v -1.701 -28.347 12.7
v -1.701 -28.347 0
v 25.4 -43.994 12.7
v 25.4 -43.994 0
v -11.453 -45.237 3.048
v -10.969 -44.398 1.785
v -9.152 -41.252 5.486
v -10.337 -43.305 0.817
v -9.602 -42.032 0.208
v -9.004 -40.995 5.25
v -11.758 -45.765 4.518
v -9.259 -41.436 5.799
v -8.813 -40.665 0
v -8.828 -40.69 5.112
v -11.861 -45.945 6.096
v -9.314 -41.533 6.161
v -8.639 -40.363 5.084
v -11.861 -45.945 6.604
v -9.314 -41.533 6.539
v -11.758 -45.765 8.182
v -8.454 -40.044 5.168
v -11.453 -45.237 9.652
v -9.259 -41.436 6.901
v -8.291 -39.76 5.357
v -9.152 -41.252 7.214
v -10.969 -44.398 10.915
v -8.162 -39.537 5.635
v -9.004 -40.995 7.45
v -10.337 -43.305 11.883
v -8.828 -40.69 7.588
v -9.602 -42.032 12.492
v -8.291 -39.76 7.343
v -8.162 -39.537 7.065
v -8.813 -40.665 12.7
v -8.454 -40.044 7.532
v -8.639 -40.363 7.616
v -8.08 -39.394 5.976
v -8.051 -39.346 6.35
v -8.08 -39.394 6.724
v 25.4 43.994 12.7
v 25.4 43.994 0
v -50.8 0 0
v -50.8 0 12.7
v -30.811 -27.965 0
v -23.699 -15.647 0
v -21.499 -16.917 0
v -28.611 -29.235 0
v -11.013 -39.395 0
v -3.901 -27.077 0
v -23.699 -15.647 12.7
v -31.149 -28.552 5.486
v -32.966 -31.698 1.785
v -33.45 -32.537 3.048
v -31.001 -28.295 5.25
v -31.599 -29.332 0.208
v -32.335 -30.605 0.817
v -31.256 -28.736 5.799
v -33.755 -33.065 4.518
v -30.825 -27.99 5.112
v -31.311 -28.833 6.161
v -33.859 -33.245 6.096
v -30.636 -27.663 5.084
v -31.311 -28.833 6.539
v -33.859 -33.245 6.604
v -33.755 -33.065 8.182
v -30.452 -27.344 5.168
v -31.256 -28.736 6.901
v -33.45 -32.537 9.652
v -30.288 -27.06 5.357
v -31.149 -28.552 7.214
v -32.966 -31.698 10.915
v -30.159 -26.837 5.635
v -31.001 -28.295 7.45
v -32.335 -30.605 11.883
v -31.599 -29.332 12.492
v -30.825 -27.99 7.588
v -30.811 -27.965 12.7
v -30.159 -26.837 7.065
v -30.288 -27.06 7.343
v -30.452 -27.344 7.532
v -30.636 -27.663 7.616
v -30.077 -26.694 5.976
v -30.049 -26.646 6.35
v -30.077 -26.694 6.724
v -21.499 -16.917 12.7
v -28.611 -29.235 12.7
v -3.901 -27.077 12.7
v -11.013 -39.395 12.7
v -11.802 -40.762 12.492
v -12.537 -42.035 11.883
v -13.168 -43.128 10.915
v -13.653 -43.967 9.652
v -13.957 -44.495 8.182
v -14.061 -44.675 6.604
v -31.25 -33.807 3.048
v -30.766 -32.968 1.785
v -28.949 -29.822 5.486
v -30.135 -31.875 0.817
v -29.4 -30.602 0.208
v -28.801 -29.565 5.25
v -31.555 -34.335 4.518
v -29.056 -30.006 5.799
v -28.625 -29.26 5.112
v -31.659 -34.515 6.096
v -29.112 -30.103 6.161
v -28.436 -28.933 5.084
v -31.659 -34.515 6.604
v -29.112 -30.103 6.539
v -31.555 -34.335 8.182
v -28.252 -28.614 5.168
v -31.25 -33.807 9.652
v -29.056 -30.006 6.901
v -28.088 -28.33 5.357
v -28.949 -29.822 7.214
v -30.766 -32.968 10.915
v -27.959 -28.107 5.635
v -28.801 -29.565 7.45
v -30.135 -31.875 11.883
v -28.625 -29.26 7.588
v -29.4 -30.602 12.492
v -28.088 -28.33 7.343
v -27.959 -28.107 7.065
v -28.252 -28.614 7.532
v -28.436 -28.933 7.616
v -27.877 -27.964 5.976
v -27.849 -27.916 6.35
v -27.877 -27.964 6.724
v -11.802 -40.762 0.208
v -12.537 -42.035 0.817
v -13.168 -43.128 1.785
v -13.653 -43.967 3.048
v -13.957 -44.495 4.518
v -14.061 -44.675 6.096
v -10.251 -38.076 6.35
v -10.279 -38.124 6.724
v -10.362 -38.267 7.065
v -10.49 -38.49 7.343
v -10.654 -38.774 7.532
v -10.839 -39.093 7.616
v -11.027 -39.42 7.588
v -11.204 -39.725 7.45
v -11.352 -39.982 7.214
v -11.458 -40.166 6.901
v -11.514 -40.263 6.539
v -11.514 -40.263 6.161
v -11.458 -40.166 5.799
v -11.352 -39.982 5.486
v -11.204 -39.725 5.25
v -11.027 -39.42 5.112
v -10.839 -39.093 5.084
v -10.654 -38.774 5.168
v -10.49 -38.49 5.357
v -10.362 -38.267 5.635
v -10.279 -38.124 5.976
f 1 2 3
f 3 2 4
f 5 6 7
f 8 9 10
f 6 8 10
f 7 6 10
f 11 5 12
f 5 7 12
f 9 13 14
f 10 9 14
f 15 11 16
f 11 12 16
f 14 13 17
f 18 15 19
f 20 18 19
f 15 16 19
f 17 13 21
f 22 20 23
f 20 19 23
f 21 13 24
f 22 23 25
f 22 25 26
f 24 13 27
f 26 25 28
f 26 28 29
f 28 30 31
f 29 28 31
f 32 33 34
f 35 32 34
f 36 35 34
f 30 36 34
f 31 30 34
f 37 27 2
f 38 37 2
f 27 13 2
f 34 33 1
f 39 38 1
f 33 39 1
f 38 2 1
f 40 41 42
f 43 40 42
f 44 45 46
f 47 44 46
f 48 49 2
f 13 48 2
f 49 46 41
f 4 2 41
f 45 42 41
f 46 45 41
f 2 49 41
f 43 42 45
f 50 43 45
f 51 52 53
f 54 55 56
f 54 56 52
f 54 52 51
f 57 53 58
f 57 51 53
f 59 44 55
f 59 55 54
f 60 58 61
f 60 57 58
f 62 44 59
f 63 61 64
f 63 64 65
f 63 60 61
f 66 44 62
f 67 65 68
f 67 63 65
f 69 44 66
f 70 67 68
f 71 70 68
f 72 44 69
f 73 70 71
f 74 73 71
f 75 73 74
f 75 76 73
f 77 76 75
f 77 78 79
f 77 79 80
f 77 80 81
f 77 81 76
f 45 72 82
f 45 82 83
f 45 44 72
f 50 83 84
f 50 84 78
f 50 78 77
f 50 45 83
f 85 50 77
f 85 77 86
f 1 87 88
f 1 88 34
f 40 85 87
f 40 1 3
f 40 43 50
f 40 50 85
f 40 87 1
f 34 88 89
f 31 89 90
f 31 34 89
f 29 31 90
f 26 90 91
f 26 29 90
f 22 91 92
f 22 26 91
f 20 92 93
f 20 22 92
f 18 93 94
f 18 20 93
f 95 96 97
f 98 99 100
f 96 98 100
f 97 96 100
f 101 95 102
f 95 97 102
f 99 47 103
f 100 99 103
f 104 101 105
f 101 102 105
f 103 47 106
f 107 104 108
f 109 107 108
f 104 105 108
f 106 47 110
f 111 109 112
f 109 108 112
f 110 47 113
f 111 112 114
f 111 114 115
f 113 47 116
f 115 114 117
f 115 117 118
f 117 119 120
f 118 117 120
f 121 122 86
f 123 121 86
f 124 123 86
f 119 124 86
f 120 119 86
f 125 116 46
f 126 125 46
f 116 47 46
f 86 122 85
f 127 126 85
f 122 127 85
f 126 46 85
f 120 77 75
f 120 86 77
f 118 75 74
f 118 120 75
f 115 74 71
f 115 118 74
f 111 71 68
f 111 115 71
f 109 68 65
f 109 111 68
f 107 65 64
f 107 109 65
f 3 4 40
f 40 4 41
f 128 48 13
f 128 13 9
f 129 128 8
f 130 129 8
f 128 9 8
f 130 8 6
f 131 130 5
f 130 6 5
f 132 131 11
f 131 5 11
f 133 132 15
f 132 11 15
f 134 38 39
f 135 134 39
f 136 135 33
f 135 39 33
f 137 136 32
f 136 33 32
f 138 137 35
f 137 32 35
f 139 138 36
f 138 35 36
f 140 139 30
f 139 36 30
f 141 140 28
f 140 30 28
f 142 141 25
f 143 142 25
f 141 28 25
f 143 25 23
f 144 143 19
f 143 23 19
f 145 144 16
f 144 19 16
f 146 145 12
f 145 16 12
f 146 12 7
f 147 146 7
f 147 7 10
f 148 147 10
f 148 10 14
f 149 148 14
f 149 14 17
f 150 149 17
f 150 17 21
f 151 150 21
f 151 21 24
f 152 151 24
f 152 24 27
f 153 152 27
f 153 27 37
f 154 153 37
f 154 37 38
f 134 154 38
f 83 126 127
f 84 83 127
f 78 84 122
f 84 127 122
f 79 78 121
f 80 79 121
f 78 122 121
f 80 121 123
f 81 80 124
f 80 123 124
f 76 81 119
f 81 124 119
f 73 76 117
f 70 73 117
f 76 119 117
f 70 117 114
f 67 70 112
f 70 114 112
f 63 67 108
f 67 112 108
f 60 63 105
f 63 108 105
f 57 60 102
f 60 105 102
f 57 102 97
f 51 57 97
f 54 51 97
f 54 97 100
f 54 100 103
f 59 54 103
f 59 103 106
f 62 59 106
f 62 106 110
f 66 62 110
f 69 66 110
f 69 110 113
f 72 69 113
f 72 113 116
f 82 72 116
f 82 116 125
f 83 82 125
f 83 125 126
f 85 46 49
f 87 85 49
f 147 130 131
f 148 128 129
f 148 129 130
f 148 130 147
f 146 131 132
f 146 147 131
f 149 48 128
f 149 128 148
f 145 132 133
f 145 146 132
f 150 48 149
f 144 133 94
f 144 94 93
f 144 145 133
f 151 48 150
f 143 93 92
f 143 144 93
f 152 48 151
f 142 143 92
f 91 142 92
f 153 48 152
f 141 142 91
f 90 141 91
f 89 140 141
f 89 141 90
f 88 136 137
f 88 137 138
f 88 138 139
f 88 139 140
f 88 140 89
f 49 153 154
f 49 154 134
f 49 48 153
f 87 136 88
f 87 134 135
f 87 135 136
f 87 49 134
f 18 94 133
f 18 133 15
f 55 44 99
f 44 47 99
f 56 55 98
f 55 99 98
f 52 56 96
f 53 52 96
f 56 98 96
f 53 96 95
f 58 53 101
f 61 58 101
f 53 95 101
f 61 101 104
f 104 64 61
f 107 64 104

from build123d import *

# Parameters (mm, degrees)
F1_DEPTH = 12.7
F2_W     = 2.54
F2_H     = 12.7
F3_DEPTH = 20.32
F4_R     = 1.27
F5_DEPTH = 39.1414
F6_R     = 6.096


with BuildPart() as f1:
    # F0 (on Top) → F1 (new body)
    with BuildSketch(Plane.XY):
        Polygon((25.4, -43.9940905122), (25.4, 43.9940905122), (-50.8, 0), align=None)
    extrude(amount=F1_DEPTH)

    # F2 (on face) → F3 (join)
    with BuildSketch(Plane(origin=(-12.7, -21.9970452561, 0), x_dir=(0.8660254038, -0.5, 0), z_dir=(-0.5, -0.8660254038, 0))):
        with Locations((11.43, 6.35)):
            Rectangle(F2_W, F2_H)
        with Locations((-11.43, 6.35)):
            Rectangle(F2_W, F2_H)
    extrude(amount=F3_DEPTH)

    # F4 (on face) → F5 (cut)
    with BuildSketch(Plane(origin=(10.9985226281, -6.35, 0), x_dir=(0.5, 0.8660254038, 0), z_dir=(0.8660254038, -0.5, 0))):
        with Locations((-39.37, 6.35)):
            Circle(F4_R)
    extrude(amount=-F5_DEPTH, mode=Mode.SUBTRACT)

    # F6
    f6_edges = [f1.edges().sort_by_distance(p)[0] for p in [
        (-32.75867, -33.879681, 0),
        (-32.75867, -33.879681, 12.7),
        (-12.96133, -45.309681, 12.7),
        (-12.96133, -45.309681, 0),
    ]]
    fillet(f6_edges, radius=F6_R)


solid = f1.part
